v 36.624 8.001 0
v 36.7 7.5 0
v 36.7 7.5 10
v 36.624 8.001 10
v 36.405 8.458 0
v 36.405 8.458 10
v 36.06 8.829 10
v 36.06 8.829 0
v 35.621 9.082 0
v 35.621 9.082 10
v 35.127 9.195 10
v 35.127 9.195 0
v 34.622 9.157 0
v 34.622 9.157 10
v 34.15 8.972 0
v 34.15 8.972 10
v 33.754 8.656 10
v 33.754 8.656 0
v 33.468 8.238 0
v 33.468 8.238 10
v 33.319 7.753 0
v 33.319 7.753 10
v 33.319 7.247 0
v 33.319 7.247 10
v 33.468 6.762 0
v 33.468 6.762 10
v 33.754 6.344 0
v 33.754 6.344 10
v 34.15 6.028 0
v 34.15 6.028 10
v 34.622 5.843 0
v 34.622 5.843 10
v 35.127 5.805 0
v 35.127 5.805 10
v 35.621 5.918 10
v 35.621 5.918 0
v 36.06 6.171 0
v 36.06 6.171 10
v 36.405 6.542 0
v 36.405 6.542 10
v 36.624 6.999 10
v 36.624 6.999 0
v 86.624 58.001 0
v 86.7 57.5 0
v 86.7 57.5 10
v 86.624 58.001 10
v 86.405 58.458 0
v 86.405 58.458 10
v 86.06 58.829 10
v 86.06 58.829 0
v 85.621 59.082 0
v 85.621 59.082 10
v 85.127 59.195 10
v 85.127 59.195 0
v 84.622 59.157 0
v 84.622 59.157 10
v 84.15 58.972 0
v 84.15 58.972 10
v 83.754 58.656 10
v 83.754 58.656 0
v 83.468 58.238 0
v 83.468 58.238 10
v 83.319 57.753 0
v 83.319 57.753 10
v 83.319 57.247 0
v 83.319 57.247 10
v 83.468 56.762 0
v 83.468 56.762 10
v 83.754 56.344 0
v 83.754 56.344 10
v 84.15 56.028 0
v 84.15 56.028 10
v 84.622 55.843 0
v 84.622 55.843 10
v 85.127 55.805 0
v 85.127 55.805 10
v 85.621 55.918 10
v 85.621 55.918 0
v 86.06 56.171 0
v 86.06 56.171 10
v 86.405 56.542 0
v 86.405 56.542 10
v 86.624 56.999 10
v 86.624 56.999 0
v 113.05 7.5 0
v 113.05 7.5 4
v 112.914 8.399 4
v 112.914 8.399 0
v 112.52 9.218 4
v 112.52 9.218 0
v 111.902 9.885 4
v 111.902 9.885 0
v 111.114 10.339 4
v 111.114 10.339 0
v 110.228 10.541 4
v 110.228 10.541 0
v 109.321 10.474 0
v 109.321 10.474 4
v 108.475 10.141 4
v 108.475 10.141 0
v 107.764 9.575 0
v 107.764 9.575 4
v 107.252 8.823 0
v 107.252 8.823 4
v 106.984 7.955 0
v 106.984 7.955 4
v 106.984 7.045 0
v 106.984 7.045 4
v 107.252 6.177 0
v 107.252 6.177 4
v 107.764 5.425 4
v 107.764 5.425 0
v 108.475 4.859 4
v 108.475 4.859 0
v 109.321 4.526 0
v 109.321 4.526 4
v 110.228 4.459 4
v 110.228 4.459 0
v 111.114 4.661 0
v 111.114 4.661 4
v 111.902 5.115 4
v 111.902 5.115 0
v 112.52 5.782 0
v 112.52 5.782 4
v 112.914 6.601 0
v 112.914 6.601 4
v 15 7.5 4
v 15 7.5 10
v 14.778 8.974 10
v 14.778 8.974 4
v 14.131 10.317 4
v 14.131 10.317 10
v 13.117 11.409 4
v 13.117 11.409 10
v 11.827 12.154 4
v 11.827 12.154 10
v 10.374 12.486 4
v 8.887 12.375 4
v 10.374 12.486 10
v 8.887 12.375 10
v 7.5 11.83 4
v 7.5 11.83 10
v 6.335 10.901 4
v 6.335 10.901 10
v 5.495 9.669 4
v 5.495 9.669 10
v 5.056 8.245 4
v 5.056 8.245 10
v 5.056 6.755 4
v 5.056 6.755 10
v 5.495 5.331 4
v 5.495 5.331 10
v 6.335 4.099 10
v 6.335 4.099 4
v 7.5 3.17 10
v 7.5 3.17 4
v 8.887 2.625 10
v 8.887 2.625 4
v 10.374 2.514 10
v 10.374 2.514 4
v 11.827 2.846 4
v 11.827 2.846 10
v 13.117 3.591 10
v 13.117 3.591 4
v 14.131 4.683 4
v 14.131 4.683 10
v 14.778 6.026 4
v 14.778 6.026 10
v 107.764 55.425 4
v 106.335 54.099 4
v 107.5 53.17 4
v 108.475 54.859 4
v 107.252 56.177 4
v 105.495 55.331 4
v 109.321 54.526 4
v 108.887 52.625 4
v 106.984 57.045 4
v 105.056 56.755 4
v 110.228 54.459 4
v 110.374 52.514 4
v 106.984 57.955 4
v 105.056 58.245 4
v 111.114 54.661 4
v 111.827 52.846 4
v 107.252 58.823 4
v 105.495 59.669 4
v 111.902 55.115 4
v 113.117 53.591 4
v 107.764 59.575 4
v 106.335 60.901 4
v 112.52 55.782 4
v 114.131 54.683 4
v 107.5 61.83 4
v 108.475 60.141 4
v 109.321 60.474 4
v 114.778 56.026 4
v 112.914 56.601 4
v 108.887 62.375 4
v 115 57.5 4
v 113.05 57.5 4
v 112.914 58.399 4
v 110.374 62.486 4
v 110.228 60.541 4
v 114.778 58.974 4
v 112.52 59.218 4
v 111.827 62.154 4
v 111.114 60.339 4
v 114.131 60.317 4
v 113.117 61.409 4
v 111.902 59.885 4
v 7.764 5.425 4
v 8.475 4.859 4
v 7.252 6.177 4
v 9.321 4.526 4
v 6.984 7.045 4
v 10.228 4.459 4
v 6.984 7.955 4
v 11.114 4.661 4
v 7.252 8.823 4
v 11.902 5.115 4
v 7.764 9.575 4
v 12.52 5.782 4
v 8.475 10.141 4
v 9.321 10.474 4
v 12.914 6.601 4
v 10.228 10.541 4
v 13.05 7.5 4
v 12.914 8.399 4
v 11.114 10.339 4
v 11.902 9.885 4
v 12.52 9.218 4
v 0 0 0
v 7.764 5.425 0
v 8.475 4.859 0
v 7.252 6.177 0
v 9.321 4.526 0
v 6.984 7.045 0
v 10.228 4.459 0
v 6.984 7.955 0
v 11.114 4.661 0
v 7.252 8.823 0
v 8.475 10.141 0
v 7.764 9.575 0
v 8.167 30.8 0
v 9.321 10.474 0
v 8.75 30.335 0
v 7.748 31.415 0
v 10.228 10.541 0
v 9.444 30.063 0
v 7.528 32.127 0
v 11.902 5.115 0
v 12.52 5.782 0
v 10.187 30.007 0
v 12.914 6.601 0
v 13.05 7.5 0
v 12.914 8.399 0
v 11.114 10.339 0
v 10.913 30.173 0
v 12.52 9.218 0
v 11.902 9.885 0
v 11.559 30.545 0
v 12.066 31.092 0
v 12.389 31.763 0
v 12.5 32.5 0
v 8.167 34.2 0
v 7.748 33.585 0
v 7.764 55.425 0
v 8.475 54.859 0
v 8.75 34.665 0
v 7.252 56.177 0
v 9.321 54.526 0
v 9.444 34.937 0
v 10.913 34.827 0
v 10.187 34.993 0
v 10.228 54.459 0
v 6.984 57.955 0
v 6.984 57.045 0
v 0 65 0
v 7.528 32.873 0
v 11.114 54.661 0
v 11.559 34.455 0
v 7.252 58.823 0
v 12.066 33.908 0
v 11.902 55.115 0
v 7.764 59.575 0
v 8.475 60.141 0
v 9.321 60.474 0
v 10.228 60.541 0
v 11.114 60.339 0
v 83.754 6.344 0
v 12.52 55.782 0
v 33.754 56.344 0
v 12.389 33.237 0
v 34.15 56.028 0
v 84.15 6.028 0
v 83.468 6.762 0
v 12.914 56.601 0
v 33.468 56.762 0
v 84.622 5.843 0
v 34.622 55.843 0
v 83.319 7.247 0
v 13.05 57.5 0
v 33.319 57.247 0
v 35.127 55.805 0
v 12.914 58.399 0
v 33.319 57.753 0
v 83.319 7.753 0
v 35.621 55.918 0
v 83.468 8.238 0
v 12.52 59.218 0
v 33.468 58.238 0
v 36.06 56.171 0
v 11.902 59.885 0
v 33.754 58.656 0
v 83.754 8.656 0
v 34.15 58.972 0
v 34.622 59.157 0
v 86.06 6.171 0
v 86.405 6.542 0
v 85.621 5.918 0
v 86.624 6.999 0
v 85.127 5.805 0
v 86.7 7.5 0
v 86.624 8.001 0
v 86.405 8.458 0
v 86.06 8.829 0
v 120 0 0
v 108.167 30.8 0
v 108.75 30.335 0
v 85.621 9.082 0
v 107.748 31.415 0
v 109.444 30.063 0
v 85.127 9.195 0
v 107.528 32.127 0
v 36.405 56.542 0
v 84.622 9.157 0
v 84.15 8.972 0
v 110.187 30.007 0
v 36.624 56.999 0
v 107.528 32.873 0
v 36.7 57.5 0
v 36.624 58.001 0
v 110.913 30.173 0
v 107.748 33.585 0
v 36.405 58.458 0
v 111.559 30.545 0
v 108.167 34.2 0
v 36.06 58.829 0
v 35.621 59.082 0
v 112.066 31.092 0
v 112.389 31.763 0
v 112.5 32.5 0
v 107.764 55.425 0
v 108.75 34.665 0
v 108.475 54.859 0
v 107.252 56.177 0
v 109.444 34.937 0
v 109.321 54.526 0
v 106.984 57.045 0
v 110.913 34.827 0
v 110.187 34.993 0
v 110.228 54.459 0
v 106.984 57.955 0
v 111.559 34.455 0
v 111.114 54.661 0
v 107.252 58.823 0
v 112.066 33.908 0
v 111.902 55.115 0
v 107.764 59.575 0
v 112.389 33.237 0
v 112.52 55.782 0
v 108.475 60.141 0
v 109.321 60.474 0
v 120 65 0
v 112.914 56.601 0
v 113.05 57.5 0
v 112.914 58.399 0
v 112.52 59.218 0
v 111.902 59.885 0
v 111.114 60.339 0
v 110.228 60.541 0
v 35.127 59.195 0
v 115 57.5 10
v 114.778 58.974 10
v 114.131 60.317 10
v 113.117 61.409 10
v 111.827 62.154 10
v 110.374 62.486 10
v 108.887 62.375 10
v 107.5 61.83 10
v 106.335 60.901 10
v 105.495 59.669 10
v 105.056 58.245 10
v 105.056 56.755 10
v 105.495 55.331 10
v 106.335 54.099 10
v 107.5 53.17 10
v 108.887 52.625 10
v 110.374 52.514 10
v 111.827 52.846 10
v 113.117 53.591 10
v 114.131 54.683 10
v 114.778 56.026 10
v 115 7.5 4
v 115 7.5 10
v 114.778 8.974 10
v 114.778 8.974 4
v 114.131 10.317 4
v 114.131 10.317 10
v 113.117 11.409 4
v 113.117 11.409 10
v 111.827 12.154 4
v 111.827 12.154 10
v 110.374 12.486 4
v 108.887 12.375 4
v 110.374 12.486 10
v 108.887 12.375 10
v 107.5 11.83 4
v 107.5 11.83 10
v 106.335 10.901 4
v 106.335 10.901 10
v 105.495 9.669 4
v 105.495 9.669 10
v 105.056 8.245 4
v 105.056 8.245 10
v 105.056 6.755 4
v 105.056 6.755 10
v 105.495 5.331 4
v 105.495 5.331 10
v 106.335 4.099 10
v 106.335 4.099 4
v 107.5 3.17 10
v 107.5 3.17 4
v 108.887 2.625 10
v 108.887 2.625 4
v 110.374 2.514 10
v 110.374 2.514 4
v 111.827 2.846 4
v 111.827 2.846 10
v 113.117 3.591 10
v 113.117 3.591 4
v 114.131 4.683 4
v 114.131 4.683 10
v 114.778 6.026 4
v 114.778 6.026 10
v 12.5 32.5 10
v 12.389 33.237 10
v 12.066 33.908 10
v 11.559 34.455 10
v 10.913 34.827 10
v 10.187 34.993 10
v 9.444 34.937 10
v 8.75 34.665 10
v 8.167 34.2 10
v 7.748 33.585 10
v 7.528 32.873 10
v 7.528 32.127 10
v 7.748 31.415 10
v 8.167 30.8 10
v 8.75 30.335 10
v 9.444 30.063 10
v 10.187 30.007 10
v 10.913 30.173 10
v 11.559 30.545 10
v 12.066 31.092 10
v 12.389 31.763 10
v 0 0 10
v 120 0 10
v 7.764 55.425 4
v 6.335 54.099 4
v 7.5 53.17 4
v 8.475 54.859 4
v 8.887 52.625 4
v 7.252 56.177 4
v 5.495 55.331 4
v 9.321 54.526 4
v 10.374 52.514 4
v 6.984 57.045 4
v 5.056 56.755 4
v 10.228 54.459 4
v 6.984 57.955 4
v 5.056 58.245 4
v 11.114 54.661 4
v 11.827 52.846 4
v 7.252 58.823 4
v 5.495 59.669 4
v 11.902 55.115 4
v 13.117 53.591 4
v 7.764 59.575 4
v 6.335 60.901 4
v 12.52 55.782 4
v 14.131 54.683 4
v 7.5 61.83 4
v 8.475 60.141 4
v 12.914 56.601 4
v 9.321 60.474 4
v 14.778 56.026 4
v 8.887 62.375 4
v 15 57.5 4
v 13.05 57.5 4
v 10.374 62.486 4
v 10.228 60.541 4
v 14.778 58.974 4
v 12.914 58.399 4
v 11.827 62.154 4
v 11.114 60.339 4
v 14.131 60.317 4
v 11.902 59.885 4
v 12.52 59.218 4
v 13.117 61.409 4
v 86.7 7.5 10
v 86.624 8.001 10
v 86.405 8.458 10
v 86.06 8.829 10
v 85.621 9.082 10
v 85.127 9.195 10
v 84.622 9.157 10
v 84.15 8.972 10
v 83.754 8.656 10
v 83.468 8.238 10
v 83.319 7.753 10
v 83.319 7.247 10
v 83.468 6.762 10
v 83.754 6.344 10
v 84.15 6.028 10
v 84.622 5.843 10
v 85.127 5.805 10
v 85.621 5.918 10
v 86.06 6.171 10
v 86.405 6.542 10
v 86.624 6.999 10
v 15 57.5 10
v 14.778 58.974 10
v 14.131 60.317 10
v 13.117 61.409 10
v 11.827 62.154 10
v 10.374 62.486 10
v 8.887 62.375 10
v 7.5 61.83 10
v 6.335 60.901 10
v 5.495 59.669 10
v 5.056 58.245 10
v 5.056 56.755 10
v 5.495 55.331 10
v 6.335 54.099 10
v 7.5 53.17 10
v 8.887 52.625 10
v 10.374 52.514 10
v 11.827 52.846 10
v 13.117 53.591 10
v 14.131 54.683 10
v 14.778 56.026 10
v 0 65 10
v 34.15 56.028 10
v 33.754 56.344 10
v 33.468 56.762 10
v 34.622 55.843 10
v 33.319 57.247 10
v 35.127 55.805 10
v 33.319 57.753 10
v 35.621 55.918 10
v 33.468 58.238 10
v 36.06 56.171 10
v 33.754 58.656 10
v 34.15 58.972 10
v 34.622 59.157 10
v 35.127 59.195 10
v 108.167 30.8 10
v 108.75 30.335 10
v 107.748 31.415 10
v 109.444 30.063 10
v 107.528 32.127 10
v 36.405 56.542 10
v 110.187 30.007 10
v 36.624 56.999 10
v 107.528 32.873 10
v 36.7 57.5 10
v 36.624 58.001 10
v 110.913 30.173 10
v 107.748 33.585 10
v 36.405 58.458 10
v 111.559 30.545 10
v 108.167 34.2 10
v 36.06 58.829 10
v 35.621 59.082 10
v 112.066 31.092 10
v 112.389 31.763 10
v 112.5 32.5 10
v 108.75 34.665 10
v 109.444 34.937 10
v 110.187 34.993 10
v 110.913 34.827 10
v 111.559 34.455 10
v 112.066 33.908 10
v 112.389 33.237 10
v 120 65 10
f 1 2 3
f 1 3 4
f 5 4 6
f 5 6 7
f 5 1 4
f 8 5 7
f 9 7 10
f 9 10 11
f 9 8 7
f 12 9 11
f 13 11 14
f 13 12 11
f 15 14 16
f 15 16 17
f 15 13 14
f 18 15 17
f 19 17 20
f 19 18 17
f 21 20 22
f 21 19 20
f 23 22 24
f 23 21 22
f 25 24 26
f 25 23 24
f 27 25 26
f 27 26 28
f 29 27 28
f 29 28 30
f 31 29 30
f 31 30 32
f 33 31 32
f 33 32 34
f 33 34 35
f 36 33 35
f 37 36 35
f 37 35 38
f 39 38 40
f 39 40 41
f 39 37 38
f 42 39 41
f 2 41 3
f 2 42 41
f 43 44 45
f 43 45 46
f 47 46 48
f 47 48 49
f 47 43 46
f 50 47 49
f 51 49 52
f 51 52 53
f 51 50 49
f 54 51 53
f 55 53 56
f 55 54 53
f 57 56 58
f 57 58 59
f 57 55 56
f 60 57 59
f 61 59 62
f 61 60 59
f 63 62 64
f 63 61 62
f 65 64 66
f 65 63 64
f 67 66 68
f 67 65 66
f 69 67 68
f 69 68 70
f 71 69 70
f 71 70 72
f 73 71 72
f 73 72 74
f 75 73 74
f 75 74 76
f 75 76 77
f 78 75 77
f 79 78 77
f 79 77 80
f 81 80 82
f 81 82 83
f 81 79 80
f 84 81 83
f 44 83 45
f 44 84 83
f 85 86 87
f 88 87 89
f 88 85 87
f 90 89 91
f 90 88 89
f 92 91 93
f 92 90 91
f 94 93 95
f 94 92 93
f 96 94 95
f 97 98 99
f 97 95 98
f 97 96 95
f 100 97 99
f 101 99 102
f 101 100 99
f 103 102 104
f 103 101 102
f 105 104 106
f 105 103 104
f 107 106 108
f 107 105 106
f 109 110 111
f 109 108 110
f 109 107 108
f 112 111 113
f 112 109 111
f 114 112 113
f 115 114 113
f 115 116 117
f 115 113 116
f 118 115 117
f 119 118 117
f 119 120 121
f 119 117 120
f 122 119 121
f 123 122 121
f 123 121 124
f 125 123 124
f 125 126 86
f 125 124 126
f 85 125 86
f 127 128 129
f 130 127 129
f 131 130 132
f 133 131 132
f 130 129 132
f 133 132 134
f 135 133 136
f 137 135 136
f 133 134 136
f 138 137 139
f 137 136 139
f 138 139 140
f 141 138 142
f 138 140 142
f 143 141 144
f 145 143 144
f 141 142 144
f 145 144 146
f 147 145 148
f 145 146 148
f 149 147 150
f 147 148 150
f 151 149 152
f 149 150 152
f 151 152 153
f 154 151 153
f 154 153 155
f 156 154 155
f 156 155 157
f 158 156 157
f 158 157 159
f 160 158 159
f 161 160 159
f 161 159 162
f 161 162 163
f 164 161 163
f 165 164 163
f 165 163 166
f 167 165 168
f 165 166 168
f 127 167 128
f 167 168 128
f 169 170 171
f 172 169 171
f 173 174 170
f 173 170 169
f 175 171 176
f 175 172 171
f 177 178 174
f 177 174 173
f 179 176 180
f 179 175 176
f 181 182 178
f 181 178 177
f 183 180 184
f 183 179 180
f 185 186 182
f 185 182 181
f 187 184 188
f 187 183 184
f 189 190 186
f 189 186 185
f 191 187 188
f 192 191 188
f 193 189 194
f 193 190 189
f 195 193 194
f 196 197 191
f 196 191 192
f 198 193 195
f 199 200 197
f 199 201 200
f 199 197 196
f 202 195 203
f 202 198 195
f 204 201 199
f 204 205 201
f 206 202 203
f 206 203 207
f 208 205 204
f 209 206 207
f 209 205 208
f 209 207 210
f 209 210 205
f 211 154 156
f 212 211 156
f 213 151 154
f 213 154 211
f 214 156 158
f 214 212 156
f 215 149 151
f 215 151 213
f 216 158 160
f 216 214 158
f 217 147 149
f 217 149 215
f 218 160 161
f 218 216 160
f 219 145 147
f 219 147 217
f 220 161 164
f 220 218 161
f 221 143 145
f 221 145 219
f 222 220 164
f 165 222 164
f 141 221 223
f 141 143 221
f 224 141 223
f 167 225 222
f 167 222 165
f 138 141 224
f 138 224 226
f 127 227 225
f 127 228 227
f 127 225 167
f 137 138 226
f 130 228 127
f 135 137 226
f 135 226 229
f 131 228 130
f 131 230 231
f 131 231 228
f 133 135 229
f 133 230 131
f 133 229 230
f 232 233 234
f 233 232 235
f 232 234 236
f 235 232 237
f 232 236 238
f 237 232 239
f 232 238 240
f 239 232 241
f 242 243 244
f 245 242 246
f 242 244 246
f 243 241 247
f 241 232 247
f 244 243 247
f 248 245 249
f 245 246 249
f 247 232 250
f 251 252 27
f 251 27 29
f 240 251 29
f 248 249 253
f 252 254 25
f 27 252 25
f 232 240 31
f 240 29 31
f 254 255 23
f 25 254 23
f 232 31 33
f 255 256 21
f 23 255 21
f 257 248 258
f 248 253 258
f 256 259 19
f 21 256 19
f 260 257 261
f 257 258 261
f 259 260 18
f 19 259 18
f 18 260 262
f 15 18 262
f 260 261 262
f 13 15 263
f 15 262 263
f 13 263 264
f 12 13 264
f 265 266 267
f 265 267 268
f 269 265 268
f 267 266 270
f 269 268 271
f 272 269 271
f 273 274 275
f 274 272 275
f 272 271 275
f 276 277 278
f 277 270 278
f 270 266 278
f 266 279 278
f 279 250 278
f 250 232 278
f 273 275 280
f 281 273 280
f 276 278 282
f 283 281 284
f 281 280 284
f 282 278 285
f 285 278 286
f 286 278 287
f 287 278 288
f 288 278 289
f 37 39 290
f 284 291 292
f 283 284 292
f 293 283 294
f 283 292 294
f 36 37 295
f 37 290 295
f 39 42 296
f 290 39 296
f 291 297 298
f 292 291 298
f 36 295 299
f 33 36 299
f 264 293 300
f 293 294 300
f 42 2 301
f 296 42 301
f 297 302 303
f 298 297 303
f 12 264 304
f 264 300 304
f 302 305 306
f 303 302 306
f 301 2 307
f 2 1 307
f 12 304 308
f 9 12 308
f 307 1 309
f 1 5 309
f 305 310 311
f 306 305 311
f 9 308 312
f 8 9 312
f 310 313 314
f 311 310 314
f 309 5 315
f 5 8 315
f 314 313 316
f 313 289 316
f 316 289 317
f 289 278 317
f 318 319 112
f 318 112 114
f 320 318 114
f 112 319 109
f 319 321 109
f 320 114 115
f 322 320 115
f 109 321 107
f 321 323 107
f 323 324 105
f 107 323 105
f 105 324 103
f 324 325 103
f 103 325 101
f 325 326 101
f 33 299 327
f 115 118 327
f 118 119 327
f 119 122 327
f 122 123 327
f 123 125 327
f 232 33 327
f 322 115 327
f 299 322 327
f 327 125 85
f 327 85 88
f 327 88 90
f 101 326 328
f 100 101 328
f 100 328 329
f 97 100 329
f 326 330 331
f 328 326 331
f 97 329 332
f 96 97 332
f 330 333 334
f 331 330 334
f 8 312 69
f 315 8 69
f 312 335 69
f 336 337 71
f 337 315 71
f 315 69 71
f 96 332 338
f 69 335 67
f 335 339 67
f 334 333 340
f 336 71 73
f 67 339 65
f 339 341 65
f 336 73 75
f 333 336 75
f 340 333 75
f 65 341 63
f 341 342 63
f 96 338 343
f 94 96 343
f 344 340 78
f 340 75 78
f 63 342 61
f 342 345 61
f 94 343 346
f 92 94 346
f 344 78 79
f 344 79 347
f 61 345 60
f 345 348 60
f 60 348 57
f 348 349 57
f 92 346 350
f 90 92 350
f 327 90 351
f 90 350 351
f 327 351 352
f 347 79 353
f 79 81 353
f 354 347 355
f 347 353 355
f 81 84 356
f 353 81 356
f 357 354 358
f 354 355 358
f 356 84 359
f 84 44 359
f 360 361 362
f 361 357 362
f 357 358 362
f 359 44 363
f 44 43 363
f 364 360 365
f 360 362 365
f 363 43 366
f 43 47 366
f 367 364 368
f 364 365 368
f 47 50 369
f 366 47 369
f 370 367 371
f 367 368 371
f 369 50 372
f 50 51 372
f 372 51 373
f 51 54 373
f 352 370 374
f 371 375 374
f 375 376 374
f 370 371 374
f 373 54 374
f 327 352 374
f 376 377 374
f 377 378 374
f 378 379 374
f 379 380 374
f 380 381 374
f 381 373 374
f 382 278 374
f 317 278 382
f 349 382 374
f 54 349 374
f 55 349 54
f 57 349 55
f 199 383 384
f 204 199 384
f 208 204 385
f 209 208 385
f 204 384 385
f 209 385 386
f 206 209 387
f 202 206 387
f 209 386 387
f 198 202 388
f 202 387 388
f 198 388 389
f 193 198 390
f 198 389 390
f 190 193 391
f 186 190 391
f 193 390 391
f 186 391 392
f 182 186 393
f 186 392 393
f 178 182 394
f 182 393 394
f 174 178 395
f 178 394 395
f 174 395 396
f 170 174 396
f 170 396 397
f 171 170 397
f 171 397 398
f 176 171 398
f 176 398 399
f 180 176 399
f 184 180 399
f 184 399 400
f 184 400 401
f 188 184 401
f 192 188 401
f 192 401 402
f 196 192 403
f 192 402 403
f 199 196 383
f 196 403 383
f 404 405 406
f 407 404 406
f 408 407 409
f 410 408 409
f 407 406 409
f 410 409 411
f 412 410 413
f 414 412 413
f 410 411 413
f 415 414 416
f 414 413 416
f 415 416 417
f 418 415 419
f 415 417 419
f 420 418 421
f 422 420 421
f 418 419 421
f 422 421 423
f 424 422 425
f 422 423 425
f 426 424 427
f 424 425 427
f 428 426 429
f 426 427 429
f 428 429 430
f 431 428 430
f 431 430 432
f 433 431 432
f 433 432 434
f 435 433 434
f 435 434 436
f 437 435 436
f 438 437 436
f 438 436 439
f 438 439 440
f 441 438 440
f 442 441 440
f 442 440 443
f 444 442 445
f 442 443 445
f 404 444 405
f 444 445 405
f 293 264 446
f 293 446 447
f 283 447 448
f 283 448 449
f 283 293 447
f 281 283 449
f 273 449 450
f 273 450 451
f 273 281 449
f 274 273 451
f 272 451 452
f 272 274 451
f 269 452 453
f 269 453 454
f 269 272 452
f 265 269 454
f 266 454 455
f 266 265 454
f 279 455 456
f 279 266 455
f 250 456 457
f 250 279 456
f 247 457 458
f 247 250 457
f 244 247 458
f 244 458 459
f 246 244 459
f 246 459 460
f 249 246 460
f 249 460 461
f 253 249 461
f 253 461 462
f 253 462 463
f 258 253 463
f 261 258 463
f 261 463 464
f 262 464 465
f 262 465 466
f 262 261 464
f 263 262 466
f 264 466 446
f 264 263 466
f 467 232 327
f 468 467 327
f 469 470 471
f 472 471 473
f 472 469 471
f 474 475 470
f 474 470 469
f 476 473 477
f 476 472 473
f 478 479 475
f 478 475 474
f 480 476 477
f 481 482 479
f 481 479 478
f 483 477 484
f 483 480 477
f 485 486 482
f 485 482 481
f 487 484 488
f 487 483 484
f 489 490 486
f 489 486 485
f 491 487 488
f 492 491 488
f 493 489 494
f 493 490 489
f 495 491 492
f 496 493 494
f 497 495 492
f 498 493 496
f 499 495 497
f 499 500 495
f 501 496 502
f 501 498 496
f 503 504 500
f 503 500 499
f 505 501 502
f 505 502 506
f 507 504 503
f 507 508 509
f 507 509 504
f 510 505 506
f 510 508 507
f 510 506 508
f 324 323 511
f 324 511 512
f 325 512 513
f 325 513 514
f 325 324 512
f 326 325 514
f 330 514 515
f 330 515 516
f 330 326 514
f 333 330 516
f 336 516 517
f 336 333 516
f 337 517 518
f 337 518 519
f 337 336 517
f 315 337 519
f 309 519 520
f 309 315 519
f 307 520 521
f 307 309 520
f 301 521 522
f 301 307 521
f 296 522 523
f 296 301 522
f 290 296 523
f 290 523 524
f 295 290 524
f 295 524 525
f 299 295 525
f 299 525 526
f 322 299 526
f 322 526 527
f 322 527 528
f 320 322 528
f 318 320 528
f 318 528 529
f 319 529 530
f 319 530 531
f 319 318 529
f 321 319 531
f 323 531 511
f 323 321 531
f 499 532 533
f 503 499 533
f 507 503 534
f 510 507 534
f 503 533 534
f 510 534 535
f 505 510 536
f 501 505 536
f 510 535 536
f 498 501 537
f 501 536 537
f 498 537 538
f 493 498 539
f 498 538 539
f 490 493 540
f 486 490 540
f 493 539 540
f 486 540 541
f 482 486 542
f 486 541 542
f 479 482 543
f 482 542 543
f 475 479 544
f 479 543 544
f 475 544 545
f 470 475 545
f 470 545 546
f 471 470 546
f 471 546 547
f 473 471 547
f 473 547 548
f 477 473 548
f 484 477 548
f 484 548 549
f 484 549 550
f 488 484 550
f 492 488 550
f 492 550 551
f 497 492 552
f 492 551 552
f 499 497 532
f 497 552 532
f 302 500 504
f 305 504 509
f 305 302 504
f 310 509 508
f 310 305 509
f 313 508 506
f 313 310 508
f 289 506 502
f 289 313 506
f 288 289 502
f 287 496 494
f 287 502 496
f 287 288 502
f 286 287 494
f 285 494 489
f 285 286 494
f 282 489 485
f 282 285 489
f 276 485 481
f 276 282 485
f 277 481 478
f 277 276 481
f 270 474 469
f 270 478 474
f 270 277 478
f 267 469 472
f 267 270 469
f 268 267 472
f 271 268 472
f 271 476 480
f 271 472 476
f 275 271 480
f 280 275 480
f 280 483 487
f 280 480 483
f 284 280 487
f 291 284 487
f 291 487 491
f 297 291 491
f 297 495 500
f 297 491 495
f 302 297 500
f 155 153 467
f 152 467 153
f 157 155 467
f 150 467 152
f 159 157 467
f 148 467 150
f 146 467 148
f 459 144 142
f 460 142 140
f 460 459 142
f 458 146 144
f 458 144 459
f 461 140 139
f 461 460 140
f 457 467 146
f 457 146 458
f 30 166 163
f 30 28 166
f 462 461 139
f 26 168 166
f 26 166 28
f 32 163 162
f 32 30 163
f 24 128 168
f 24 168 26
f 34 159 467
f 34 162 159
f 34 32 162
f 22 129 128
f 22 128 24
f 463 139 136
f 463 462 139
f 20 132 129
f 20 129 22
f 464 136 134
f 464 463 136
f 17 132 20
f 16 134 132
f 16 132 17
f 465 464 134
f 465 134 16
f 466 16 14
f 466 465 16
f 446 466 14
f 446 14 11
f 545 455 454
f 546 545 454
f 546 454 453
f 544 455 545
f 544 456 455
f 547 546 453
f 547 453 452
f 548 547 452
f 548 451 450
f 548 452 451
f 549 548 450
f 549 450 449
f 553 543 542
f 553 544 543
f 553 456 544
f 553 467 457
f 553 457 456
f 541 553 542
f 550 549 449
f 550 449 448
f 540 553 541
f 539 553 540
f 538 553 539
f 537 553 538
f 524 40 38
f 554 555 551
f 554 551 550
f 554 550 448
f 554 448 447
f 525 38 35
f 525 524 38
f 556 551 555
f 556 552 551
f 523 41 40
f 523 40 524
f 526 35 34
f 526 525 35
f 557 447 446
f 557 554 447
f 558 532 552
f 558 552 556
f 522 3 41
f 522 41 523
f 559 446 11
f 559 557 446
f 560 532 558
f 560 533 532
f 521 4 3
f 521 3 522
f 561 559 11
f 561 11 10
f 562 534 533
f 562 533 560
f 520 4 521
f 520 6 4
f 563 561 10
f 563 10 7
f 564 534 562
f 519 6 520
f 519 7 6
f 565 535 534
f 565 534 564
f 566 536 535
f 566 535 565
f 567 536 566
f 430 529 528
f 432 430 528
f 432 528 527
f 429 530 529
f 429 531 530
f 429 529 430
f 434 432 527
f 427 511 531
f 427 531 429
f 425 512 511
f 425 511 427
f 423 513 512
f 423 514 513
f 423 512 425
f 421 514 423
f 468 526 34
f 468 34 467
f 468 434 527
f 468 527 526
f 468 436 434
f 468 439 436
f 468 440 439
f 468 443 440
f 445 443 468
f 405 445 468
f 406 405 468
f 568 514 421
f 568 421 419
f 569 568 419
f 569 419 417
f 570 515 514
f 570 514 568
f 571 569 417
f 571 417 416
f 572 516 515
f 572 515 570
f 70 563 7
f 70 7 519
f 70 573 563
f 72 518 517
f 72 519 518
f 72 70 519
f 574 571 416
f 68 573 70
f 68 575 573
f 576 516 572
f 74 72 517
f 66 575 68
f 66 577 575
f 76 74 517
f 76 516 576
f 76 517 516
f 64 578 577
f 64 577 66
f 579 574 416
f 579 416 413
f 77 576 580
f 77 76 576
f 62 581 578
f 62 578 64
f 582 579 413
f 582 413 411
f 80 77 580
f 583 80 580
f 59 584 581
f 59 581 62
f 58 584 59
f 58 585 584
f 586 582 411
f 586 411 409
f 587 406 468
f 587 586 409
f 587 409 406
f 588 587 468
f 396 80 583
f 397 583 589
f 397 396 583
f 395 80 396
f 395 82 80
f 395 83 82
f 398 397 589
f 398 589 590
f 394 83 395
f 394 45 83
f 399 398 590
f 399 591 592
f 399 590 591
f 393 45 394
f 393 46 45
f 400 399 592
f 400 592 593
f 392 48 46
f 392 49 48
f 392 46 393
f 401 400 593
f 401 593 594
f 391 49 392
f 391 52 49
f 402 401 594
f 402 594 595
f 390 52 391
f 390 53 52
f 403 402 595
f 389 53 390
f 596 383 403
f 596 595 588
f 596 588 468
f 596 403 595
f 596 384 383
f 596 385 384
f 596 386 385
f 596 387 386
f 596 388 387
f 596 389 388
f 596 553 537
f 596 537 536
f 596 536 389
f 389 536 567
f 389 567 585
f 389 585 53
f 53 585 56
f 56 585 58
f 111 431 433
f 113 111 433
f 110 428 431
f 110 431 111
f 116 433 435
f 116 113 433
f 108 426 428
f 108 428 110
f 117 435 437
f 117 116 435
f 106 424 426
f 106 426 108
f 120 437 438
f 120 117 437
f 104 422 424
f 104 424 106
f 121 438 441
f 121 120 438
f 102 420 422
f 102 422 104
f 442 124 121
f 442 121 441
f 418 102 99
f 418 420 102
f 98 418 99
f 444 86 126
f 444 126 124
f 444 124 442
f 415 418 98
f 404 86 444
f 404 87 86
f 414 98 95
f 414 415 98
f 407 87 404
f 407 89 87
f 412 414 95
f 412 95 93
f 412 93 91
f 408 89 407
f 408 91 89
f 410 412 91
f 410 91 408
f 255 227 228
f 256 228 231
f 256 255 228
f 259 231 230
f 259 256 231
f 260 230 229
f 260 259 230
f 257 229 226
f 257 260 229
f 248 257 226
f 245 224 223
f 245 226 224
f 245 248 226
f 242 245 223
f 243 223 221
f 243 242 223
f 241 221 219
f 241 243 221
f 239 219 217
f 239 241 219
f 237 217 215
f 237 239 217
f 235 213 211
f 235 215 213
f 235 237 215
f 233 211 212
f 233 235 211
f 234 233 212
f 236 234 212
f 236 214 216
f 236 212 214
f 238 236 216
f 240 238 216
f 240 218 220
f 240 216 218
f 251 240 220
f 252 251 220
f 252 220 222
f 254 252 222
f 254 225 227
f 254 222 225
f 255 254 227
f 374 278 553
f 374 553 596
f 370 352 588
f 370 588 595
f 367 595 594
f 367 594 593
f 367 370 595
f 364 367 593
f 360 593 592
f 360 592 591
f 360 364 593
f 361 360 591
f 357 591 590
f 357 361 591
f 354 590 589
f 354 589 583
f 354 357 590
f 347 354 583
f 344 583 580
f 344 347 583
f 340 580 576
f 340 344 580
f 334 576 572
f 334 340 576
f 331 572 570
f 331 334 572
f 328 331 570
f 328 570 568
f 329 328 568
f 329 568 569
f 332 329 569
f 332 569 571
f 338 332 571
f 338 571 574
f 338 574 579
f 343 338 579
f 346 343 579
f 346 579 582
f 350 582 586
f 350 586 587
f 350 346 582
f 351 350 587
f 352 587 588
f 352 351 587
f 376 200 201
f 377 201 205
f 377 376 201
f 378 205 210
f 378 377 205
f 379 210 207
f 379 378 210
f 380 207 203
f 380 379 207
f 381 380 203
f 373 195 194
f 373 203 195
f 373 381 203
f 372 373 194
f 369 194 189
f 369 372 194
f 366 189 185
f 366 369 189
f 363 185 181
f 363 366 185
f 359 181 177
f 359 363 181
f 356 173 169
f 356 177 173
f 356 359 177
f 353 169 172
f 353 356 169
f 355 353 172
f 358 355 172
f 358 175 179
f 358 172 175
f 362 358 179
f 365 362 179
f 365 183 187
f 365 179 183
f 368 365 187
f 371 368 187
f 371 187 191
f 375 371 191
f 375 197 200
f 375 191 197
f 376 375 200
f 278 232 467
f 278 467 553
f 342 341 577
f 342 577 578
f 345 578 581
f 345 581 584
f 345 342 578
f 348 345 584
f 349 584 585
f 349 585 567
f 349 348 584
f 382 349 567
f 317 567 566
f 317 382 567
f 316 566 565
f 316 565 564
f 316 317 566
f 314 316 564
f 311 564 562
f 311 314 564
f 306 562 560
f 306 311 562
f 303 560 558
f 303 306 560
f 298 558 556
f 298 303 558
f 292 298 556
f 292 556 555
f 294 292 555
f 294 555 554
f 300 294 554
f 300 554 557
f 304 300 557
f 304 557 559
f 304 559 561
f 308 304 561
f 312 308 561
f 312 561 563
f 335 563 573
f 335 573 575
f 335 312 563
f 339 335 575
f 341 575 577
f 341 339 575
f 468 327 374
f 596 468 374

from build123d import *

# Parameters (mm, degrees)
SKETCH1_W           = 120
SKETCH1_H           = 65
SKETCH1_R           = 1.7
SKETCH1_R_2         = 3.05
SKETCH1_R_3         = 2.5
BOSS_EXTRUDE1_DEPTH = 10
SKETCH2_R           = 5
CUT_EXTRUDE1_DEPTH  = 6


with BuildPart() as part:
    # Sketch1 → Boss-Extrude1 (new body)
    with BuildSketch(Plane.XY):
        with Locations((60, 32.5)):
            Rectangle(SKETCH1_W, SKETCH1_H)
        with Locations((85, 7.5)):
            Circle(SKETCH1_R, mode=Mode.SUBTRACT)
        with Locations((85, 57.5)):
            Circle(SKETCH1_R, mode=Mode.SUBTRACT)
        with Locations((35, 7.5)):
            Circle(SKETCH1_R, mode=Mode.SUBTRACT)
        with Locations((35, 57.5)):
            Circle(SKETCH1_R, mode=Mode.SUBTRACT)
        with Locations((110, 7.5)):
            Circle(SKETCH1_R_2, mode=Mode.SUBTRACT)
        with Locations((110, 57.5)):
            Circle(SKETCH1_R_2, mode=Mode.SUBTRACT)
        with Locations((10, 7.5)):
            Circle(SKETCH1_R_2, mode=Mode.SUBTRACT)
        with Locations((10, 57.5)):
            Circle(SKETCH1_R_2, mode=Mode.SUBTRACT)
        with Locations((110, 32.5)):
            Circle(SKETCH1_R_3, mode=Mode.SUBTRACT)
        with Locations((10, 32.5)):
            Circle(SKETCH1_R_3, mode=Mode.SUBTRACT)
    extrude(amount=BOSS_EXTRUDE1_DEPTH)

    # Sketch2 → Cut-Extrude1 (cut)
    with BuildSketch(Plane.XY.offset(10)):
        with Locations((110, 7.5)):
            Circle(SKETCH2_R)
        with Locations((110, 57.5)):
            Circle(SKETCH2_R)
        with Locations((10, 57.5)):
            Circle(SKETCH2_R)
        with Locations((10, 7.5)):
            Circle(SKETCH2_R)
    extrude(amount=-CUT_EXTRUDE1_DEPTH, mode=Mode.SUBTRACT)


solid = part.part
